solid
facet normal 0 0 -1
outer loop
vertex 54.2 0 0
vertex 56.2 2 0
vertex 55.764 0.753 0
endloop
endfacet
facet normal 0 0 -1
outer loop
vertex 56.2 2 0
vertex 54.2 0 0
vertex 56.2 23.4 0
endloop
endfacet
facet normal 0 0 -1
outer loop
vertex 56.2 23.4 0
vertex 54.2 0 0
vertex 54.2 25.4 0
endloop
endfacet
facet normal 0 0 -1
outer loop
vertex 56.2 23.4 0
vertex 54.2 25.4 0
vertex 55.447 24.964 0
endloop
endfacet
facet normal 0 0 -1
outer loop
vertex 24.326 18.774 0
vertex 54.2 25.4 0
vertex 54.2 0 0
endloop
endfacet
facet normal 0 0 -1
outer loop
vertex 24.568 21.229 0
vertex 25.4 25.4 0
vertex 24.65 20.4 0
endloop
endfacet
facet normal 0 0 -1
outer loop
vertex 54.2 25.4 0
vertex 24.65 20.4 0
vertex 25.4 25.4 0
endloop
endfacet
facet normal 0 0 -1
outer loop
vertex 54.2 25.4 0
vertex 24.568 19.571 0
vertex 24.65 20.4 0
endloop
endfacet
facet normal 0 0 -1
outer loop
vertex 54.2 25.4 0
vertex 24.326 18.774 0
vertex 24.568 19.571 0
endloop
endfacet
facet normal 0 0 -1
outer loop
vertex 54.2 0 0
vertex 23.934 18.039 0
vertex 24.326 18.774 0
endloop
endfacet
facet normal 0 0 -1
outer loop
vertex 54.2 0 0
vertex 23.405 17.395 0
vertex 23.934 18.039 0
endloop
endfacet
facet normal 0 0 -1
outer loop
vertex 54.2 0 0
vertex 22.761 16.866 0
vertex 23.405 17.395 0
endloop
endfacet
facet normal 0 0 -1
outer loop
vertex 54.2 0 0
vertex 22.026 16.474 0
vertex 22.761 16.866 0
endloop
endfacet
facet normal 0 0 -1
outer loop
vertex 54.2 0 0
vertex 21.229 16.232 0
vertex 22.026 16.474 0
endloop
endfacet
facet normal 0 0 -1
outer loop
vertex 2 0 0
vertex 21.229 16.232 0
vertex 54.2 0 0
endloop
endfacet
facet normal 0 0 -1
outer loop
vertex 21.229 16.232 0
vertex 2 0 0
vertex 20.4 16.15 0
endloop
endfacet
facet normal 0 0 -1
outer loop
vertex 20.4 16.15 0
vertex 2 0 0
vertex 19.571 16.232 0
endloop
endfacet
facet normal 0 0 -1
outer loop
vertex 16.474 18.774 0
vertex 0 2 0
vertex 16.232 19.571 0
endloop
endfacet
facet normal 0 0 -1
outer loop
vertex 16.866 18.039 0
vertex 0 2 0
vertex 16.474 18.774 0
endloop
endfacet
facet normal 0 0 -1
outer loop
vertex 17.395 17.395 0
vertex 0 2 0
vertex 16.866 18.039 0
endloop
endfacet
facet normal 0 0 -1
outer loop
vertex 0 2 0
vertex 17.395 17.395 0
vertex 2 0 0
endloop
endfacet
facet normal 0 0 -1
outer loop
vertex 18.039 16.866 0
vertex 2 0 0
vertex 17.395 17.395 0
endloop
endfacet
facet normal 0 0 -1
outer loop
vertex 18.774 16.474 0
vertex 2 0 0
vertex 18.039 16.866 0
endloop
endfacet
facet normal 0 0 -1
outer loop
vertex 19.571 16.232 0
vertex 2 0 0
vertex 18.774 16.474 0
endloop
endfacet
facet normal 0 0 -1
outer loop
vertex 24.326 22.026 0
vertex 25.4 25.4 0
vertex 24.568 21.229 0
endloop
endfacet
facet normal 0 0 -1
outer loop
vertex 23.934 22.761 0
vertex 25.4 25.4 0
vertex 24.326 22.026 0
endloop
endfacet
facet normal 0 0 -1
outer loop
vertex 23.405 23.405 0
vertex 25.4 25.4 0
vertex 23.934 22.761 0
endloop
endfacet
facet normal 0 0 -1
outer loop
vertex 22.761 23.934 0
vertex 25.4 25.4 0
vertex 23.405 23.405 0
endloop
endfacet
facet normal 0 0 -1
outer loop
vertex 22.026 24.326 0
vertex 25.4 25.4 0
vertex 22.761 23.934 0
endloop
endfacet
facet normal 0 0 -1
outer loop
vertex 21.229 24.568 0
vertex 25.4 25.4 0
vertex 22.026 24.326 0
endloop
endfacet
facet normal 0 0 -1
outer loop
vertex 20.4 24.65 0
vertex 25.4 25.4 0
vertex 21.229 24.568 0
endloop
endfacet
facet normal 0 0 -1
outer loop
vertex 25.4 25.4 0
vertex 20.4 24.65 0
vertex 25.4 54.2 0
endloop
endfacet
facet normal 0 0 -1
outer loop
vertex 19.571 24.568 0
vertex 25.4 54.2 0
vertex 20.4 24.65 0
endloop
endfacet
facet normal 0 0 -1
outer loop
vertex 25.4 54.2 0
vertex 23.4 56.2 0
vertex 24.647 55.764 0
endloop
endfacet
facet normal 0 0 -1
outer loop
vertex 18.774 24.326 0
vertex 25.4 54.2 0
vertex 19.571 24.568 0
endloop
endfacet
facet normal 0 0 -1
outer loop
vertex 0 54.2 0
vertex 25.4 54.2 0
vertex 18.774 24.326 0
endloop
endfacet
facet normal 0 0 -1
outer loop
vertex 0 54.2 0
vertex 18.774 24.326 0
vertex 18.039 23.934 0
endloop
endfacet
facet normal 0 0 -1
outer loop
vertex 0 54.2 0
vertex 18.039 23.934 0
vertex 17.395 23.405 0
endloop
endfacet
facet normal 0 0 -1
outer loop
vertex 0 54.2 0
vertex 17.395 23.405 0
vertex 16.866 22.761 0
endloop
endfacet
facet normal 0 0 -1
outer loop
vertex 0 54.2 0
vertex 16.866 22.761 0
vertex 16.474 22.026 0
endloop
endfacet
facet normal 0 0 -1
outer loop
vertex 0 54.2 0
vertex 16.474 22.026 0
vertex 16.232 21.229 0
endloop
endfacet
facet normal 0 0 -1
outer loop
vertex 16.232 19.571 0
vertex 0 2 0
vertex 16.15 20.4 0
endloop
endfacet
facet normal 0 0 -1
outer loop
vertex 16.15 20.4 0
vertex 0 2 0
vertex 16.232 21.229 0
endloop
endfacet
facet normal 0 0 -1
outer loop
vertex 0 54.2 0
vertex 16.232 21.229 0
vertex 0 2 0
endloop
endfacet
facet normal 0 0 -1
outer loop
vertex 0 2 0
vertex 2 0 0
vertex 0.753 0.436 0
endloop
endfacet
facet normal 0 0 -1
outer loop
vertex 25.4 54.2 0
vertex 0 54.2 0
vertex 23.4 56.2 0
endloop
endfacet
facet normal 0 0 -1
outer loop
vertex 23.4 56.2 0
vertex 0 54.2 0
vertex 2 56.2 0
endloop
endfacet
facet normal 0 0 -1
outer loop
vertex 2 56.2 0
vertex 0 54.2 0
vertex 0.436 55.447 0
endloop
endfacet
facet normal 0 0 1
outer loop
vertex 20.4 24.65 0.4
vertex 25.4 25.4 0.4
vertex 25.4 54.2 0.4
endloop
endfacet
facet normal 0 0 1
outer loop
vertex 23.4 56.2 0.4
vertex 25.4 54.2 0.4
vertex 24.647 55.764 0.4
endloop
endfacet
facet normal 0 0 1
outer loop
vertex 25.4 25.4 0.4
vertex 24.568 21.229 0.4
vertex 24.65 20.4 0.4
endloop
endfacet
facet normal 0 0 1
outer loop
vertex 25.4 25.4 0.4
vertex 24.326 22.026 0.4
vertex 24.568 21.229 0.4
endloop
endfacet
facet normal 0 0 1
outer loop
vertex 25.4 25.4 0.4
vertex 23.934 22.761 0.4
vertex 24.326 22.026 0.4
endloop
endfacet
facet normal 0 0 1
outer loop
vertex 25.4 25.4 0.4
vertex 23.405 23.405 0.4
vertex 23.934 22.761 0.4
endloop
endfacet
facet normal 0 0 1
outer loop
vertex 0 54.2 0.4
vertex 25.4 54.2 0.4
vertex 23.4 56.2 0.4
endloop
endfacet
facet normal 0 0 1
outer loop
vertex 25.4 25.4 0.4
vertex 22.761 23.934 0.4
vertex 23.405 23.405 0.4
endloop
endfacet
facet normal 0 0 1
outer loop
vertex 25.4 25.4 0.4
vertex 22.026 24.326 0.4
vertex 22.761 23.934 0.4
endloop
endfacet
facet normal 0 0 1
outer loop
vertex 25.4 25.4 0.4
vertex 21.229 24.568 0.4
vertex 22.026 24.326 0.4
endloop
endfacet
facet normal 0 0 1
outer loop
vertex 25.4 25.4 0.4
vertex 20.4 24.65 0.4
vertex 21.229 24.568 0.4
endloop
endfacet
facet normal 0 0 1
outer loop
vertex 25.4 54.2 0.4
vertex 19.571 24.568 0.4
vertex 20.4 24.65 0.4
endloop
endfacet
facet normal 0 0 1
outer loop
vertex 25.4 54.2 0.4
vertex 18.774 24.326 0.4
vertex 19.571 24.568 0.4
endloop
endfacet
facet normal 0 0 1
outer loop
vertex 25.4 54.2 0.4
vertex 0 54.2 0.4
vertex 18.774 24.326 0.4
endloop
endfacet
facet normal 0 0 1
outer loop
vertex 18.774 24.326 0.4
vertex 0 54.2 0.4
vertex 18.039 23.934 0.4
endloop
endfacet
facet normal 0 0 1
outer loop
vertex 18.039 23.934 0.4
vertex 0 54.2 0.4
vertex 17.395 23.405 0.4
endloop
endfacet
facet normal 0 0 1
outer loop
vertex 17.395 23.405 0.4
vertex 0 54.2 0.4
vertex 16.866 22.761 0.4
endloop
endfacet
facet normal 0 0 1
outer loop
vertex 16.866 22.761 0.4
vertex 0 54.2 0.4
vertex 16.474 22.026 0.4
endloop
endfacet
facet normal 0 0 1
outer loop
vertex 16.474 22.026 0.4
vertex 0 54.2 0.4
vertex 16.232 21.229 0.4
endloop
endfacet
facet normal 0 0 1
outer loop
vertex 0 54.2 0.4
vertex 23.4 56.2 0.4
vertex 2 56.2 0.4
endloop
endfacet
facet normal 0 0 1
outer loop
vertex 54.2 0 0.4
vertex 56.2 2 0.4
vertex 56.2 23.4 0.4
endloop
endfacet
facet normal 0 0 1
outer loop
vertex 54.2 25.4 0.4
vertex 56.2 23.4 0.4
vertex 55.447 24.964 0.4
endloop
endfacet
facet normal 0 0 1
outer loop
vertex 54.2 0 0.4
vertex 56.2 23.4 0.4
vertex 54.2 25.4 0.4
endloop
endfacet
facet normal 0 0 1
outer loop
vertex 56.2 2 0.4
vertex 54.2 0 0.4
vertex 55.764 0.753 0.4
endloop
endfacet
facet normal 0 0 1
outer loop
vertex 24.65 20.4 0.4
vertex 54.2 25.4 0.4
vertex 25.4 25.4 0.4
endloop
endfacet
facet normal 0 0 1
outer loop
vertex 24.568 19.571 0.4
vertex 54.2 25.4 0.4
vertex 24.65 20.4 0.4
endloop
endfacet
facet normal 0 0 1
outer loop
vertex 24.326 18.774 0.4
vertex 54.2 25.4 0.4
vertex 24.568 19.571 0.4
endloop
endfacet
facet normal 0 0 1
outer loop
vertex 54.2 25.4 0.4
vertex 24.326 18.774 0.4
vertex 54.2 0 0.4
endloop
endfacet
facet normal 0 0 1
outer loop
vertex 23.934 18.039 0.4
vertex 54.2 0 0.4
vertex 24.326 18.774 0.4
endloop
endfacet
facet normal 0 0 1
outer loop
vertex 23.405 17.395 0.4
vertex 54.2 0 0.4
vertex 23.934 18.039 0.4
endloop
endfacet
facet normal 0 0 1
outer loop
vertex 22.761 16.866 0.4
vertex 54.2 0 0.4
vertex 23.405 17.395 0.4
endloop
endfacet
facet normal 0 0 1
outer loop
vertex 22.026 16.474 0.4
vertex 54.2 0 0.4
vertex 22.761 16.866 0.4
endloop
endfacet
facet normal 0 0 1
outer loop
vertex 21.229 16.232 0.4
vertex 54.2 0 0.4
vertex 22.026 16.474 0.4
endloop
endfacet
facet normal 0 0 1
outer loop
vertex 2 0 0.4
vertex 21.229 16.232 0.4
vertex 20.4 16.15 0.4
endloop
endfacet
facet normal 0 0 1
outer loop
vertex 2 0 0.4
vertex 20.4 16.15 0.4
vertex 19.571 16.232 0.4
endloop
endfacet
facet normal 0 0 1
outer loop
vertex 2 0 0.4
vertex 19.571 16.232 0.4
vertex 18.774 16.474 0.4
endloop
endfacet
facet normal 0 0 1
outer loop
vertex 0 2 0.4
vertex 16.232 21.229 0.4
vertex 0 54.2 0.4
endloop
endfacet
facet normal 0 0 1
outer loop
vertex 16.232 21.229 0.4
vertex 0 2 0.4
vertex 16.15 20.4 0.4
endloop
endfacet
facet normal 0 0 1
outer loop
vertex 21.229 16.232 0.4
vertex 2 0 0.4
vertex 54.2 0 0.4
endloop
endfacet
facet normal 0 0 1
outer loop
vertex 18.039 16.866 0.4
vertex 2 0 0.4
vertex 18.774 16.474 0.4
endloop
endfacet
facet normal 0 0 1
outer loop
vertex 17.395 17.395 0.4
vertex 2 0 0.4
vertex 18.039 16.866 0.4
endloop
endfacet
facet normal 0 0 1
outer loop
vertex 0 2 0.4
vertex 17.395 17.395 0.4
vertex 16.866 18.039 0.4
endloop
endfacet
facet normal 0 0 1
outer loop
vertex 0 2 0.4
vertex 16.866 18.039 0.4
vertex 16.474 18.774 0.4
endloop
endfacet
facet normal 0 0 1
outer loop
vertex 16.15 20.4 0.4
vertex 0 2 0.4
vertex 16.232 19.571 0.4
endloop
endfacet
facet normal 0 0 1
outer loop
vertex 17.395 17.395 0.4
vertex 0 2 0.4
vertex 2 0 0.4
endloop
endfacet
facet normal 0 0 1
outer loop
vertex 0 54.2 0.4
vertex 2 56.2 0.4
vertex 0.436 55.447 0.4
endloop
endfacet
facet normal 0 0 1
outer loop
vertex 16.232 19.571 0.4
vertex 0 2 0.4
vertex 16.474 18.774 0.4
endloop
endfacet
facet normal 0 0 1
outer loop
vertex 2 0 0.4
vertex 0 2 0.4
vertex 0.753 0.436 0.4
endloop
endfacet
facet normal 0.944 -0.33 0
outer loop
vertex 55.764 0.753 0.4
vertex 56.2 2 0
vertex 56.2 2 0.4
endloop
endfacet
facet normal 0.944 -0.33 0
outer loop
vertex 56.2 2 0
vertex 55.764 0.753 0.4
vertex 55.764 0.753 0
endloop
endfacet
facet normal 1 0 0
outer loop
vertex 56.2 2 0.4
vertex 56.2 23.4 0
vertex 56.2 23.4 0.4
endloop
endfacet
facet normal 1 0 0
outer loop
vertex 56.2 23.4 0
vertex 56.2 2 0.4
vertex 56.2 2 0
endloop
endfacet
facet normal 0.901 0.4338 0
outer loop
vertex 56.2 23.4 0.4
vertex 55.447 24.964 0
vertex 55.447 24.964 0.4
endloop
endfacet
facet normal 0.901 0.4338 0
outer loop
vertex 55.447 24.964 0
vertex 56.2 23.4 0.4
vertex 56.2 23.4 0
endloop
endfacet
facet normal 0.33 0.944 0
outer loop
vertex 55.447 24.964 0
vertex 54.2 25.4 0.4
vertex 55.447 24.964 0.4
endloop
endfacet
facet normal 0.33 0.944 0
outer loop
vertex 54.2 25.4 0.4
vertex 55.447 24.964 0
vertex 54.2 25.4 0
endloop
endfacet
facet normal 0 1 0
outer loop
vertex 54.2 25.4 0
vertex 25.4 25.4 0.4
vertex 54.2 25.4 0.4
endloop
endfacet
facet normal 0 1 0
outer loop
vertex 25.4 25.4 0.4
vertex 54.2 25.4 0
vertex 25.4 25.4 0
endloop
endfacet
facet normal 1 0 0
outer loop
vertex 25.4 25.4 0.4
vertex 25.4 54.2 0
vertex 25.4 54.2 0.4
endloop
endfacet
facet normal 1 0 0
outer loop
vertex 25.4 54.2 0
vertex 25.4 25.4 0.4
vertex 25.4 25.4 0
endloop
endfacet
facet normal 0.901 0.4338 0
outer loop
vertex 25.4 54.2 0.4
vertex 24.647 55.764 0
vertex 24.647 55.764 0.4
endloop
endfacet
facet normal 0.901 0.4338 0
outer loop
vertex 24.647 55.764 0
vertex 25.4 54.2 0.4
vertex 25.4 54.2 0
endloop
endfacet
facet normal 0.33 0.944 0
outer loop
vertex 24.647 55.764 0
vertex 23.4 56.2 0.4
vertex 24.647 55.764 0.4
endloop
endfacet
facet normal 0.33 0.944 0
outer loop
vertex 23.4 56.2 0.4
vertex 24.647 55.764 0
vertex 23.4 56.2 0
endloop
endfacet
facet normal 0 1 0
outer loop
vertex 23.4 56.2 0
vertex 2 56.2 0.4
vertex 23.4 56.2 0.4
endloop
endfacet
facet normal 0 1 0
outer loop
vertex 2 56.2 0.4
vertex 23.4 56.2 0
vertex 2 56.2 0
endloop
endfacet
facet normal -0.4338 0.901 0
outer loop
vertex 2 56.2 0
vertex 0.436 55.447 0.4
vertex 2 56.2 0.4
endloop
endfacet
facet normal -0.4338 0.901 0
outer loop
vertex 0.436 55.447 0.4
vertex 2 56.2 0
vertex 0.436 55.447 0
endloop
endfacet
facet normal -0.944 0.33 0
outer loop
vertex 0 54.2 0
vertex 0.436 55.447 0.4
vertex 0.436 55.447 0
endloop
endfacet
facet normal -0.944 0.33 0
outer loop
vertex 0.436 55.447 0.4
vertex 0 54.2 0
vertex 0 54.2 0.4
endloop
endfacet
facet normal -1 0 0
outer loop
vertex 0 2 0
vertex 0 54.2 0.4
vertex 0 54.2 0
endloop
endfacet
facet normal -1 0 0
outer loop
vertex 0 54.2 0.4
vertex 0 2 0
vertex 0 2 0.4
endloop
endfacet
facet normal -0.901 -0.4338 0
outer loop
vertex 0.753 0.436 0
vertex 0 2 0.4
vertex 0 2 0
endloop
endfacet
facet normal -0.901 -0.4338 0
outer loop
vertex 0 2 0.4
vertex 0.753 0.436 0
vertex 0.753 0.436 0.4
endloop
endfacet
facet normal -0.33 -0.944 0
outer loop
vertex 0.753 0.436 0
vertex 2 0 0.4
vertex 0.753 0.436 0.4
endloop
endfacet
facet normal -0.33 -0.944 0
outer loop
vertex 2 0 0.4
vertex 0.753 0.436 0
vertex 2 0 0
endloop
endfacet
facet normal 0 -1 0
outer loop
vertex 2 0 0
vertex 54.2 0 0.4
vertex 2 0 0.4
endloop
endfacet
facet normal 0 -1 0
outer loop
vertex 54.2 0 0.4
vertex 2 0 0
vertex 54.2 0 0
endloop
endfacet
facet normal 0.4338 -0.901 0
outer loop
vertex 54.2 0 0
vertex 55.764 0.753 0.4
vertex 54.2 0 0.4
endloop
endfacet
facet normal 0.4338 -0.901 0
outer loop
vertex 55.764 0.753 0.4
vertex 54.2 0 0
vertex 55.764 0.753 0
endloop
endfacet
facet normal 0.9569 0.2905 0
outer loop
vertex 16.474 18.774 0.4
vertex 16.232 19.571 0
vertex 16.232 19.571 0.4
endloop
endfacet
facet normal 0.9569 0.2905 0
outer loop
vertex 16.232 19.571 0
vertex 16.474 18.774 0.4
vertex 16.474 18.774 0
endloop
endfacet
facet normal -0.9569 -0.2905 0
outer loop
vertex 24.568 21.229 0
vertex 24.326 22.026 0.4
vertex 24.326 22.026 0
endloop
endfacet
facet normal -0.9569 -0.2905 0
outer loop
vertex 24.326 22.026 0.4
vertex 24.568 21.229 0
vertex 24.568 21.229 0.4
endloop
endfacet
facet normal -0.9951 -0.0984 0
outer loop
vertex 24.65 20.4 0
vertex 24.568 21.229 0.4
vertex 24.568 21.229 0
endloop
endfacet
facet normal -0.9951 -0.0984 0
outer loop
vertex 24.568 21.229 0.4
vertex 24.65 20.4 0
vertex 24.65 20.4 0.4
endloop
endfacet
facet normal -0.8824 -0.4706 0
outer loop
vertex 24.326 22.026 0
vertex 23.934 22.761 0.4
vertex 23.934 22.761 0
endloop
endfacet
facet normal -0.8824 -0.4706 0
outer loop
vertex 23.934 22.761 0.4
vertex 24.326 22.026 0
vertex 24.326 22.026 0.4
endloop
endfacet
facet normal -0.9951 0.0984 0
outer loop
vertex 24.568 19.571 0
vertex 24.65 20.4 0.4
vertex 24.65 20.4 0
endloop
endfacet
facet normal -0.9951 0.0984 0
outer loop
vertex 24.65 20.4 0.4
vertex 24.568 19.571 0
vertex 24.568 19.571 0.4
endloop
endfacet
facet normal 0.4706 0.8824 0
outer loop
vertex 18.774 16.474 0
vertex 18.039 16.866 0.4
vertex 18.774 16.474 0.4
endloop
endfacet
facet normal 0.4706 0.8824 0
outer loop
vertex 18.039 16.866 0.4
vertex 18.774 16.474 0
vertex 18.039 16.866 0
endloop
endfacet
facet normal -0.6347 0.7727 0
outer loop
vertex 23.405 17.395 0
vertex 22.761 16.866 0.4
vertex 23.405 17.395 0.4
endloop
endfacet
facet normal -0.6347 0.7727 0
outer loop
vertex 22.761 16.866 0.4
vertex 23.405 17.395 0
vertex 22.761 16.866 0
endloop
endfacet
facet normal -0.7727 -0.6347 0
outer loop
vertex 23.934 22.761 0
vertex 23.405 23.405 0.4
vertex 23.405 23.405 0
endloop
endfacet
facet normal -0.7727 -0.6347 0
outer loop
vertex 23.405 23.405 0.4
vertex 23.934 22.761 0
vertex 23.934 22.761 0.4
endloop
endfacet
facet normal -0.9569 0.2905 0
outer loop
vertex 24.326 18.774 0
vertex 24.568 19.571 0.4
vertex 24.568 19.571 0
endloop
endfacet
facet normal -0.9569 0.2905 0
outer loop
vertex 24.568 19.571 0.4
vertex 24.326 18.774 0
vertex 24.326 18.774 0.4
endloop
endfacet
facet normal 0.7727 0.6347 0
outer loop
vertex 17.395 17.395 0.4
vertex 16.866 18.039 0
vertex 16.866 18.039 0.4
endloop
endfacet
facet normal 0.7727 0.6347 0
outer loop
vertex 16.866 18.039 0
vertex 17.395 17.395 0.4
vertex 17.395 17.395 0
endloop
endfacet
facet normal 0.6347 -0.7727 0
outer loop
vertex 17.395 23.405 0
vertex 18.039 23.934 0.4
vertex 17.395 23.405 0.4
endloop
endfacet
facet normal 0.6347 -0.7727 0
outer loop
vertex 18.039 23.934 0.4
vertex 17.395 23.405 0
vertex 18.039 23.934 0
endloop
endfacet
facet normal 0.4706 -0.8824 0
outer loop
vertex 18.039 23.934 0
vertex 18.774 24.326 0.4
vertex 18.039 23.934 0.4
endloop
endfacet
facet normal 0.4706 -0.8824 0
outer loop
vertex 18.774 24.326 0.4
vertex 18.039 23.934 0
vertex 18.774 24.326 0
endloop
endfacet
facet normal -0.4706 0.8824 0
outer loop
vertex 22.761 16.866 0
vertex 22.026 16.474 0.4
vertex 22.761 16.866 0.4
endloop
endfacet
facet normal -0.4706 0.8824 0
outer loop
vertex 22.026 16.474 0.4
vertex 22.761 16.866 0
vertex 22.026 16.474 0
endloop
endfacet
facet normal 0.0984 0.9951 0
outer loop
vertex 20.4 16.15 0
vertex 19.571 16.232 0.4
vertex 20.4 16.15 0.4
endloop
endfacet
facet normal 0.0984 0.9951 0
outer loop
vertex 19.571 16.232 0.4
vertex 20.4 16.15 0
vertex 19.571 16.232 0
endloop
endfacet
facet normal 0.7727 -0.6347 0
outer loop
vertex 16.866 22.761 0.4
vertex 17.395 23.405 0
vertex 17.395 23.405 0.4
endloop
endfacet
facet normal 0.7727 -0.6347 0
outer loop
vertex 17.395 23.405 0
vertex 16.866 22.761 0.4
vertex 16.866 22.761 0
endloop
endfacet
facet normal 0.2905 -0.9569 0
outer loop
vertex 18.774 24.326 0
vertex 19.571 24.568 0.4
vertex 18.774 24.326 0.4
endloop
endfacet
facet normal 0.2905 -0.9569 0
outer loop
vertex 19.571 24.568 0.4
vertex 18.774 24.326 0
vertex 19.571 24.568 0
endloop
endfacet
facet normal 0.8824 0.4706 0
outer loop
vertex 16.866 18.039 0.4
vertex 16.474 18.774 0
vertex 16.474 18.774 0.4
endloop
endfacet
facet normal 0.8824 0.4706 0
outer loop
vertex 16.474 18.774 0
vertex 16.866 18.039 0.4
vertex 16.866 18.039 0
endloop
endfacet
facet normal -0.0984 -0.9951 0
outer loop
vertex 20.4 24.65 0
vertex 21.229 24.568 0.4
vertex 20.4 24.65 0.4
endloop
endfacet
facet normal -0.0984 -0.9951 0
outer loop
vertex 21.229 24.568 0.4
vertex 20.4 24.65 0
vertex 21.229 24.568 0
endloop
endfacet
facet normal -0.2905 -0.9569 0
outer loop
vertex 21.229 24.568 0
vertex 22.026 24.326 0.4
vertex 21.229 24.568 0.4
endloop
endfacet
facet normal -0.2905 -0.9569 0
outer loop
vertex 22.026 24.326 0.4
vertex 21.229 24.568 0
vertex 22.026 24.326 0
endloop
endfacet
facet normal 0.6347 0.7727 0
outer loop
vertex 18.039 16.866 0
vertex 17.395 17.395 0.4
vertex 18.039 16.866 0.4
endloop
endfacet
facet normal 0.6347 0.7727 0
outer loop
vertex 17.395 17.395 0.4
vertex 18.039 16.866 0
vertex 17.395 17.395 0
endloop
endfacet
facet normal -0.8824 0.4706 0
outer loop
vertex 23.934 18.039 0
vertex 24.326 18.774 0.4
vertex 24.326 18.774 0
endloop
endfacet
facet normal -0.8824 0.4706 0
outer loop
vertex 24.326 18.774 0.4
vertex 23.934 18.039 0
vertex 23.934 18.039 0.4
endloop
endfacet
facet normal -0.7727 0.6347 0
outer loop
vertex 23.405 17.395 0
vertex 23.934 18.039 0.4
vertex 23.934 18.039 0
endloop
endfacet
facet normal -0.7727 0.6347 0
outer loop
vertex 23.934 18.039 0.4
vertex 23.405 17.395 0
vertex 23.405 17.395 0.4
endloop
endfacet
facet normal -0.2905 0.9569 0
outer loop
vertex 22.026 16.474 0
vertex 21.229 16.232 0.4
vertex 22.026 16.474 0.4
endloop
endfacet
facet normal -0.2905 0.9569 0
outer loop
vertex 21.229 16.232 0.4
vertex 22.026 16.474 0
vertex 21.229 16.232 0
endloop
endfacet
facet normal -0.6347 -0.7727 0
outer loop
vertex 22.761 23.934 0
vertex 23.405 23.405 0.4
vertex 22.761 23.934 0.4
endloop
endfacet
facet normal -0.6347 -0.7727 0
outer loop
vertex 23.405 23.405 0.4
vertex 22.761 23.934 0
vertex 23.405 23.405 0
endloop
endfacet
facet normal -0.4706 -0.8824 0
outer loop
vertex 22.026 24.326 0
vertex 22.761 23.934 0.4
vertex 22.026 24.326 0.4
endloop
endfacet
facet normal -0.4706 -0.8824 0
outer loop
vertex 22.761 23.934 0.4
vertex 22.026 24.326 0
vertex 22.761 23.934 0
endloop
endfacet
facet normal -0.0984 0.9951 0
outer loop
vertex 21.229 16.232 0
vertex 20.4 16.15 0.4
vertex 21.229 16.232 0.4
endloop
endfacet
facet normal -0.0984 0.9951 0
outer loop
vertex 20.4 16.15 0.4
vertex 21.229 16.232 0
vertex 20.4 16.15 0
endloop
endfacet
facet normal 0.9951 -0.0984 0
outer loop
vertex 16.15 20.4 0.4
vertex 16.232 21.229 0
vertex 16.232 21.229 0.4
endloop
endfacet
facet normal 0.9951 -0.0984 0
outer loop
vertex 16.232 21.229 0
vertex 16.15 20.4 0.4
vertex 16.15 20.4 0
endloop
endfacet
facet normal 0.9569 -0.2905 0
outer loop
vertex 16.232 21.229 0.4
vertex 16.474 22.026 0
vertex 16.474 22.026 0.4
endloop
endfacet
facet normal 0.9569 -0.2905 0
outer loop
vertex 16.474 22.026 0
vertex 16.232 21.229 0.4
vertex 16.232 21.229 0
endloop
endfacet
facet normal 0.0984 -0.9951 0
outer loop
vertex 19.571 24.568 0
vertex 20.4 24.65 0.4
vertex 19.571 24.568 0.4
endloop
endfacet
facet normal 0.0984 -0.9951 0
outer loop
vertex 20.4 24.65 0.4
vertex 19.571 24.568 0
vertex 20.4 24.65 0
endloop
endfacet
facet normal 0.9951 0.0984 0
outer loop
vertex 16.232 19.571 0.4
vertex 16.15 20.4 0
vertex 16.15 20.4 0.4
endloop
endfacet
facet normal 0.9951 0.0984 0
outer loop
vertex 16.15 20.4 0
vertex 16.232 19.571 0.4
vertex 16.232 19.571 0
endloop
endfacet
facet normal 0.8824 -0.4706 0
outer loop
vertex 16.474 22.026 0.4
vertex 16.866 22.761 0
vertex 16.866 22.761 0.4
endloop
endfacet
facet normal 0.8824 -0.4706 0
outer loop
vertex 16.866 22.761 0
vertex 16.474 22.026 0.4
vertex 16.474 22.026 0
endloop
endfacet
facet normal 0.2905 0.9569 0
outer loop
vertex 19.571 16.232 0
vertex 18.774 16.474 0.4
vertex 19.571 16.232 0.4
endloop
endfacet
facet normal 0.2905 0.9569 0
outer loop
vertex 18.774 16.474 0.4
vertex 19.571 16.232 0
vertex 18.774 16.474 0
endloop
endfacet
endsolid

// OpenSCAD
// file: params.scad
// Shared parameters for PIU LX Pad TPU spacers
// Include this file in other .scad files with:
//   include <params.scad>

// ============================================================
// L-BRACKET DIMENSIONS
// ============================================================

bracket_length = 69.7; // mm
bracket_width = 26.5; // mm
bracket_thickness = 3.6; // mm (metal + foam)

// ============================================================
// CORNER BRACKET DIMENSIONS
// ============================================================

arm_length_x = 56.2; // mm
arm_length_y = 56.2; // mm
arm_width = 25.4; // mm

// ============================================================
// SCREW HOLE
// ============================================================

screw_hole_diameter = 8.5; // mm
screw_hole_x = 5; // mm — from inner corner of L
screw_hole_y = 5; // mm — from inner corner of L

// ============================================================
// SHARED
// ============================================================

corner_radius = 2; // mm
spacer_thickness = 0.4; // mm — for test spacers

// ============================================================
// SHARED MODULES
// ============================================================

module rounded_rect(l, w, h, r) {
    linear_extrude(height = h)
        offset(r = r)
            square([l - 2*r, w - 2*r], center = true);
}

module l_shape(lx, ly, w) {
    union() {
        square([lx, w]);
        square([w, ly]);
    }
}

module l_shape_rounded(lx, ly, w, r) {
    offset(r = r)
    offset(delta = -r)
        l_shape(lx, ly, w);
}
// main file
// Test spacer for corner bracket topper — 0.2mm shim
// Stack on top of the corner bracket topper to dial in thickness.

include <params.scad>

difference() {
    linear_extrude(height = spacer_thickness)
        l_shape_rounded(arm_length_x, arm_length_y, arm_width, corner_radius);

    translate([arm_width - screw_hole_x,
               arm_width - screw_hole_y, -0.5])
        cylinder(h = spacer_thickness + 1, d = screw_hole_diameter, $fn = 32);
}
